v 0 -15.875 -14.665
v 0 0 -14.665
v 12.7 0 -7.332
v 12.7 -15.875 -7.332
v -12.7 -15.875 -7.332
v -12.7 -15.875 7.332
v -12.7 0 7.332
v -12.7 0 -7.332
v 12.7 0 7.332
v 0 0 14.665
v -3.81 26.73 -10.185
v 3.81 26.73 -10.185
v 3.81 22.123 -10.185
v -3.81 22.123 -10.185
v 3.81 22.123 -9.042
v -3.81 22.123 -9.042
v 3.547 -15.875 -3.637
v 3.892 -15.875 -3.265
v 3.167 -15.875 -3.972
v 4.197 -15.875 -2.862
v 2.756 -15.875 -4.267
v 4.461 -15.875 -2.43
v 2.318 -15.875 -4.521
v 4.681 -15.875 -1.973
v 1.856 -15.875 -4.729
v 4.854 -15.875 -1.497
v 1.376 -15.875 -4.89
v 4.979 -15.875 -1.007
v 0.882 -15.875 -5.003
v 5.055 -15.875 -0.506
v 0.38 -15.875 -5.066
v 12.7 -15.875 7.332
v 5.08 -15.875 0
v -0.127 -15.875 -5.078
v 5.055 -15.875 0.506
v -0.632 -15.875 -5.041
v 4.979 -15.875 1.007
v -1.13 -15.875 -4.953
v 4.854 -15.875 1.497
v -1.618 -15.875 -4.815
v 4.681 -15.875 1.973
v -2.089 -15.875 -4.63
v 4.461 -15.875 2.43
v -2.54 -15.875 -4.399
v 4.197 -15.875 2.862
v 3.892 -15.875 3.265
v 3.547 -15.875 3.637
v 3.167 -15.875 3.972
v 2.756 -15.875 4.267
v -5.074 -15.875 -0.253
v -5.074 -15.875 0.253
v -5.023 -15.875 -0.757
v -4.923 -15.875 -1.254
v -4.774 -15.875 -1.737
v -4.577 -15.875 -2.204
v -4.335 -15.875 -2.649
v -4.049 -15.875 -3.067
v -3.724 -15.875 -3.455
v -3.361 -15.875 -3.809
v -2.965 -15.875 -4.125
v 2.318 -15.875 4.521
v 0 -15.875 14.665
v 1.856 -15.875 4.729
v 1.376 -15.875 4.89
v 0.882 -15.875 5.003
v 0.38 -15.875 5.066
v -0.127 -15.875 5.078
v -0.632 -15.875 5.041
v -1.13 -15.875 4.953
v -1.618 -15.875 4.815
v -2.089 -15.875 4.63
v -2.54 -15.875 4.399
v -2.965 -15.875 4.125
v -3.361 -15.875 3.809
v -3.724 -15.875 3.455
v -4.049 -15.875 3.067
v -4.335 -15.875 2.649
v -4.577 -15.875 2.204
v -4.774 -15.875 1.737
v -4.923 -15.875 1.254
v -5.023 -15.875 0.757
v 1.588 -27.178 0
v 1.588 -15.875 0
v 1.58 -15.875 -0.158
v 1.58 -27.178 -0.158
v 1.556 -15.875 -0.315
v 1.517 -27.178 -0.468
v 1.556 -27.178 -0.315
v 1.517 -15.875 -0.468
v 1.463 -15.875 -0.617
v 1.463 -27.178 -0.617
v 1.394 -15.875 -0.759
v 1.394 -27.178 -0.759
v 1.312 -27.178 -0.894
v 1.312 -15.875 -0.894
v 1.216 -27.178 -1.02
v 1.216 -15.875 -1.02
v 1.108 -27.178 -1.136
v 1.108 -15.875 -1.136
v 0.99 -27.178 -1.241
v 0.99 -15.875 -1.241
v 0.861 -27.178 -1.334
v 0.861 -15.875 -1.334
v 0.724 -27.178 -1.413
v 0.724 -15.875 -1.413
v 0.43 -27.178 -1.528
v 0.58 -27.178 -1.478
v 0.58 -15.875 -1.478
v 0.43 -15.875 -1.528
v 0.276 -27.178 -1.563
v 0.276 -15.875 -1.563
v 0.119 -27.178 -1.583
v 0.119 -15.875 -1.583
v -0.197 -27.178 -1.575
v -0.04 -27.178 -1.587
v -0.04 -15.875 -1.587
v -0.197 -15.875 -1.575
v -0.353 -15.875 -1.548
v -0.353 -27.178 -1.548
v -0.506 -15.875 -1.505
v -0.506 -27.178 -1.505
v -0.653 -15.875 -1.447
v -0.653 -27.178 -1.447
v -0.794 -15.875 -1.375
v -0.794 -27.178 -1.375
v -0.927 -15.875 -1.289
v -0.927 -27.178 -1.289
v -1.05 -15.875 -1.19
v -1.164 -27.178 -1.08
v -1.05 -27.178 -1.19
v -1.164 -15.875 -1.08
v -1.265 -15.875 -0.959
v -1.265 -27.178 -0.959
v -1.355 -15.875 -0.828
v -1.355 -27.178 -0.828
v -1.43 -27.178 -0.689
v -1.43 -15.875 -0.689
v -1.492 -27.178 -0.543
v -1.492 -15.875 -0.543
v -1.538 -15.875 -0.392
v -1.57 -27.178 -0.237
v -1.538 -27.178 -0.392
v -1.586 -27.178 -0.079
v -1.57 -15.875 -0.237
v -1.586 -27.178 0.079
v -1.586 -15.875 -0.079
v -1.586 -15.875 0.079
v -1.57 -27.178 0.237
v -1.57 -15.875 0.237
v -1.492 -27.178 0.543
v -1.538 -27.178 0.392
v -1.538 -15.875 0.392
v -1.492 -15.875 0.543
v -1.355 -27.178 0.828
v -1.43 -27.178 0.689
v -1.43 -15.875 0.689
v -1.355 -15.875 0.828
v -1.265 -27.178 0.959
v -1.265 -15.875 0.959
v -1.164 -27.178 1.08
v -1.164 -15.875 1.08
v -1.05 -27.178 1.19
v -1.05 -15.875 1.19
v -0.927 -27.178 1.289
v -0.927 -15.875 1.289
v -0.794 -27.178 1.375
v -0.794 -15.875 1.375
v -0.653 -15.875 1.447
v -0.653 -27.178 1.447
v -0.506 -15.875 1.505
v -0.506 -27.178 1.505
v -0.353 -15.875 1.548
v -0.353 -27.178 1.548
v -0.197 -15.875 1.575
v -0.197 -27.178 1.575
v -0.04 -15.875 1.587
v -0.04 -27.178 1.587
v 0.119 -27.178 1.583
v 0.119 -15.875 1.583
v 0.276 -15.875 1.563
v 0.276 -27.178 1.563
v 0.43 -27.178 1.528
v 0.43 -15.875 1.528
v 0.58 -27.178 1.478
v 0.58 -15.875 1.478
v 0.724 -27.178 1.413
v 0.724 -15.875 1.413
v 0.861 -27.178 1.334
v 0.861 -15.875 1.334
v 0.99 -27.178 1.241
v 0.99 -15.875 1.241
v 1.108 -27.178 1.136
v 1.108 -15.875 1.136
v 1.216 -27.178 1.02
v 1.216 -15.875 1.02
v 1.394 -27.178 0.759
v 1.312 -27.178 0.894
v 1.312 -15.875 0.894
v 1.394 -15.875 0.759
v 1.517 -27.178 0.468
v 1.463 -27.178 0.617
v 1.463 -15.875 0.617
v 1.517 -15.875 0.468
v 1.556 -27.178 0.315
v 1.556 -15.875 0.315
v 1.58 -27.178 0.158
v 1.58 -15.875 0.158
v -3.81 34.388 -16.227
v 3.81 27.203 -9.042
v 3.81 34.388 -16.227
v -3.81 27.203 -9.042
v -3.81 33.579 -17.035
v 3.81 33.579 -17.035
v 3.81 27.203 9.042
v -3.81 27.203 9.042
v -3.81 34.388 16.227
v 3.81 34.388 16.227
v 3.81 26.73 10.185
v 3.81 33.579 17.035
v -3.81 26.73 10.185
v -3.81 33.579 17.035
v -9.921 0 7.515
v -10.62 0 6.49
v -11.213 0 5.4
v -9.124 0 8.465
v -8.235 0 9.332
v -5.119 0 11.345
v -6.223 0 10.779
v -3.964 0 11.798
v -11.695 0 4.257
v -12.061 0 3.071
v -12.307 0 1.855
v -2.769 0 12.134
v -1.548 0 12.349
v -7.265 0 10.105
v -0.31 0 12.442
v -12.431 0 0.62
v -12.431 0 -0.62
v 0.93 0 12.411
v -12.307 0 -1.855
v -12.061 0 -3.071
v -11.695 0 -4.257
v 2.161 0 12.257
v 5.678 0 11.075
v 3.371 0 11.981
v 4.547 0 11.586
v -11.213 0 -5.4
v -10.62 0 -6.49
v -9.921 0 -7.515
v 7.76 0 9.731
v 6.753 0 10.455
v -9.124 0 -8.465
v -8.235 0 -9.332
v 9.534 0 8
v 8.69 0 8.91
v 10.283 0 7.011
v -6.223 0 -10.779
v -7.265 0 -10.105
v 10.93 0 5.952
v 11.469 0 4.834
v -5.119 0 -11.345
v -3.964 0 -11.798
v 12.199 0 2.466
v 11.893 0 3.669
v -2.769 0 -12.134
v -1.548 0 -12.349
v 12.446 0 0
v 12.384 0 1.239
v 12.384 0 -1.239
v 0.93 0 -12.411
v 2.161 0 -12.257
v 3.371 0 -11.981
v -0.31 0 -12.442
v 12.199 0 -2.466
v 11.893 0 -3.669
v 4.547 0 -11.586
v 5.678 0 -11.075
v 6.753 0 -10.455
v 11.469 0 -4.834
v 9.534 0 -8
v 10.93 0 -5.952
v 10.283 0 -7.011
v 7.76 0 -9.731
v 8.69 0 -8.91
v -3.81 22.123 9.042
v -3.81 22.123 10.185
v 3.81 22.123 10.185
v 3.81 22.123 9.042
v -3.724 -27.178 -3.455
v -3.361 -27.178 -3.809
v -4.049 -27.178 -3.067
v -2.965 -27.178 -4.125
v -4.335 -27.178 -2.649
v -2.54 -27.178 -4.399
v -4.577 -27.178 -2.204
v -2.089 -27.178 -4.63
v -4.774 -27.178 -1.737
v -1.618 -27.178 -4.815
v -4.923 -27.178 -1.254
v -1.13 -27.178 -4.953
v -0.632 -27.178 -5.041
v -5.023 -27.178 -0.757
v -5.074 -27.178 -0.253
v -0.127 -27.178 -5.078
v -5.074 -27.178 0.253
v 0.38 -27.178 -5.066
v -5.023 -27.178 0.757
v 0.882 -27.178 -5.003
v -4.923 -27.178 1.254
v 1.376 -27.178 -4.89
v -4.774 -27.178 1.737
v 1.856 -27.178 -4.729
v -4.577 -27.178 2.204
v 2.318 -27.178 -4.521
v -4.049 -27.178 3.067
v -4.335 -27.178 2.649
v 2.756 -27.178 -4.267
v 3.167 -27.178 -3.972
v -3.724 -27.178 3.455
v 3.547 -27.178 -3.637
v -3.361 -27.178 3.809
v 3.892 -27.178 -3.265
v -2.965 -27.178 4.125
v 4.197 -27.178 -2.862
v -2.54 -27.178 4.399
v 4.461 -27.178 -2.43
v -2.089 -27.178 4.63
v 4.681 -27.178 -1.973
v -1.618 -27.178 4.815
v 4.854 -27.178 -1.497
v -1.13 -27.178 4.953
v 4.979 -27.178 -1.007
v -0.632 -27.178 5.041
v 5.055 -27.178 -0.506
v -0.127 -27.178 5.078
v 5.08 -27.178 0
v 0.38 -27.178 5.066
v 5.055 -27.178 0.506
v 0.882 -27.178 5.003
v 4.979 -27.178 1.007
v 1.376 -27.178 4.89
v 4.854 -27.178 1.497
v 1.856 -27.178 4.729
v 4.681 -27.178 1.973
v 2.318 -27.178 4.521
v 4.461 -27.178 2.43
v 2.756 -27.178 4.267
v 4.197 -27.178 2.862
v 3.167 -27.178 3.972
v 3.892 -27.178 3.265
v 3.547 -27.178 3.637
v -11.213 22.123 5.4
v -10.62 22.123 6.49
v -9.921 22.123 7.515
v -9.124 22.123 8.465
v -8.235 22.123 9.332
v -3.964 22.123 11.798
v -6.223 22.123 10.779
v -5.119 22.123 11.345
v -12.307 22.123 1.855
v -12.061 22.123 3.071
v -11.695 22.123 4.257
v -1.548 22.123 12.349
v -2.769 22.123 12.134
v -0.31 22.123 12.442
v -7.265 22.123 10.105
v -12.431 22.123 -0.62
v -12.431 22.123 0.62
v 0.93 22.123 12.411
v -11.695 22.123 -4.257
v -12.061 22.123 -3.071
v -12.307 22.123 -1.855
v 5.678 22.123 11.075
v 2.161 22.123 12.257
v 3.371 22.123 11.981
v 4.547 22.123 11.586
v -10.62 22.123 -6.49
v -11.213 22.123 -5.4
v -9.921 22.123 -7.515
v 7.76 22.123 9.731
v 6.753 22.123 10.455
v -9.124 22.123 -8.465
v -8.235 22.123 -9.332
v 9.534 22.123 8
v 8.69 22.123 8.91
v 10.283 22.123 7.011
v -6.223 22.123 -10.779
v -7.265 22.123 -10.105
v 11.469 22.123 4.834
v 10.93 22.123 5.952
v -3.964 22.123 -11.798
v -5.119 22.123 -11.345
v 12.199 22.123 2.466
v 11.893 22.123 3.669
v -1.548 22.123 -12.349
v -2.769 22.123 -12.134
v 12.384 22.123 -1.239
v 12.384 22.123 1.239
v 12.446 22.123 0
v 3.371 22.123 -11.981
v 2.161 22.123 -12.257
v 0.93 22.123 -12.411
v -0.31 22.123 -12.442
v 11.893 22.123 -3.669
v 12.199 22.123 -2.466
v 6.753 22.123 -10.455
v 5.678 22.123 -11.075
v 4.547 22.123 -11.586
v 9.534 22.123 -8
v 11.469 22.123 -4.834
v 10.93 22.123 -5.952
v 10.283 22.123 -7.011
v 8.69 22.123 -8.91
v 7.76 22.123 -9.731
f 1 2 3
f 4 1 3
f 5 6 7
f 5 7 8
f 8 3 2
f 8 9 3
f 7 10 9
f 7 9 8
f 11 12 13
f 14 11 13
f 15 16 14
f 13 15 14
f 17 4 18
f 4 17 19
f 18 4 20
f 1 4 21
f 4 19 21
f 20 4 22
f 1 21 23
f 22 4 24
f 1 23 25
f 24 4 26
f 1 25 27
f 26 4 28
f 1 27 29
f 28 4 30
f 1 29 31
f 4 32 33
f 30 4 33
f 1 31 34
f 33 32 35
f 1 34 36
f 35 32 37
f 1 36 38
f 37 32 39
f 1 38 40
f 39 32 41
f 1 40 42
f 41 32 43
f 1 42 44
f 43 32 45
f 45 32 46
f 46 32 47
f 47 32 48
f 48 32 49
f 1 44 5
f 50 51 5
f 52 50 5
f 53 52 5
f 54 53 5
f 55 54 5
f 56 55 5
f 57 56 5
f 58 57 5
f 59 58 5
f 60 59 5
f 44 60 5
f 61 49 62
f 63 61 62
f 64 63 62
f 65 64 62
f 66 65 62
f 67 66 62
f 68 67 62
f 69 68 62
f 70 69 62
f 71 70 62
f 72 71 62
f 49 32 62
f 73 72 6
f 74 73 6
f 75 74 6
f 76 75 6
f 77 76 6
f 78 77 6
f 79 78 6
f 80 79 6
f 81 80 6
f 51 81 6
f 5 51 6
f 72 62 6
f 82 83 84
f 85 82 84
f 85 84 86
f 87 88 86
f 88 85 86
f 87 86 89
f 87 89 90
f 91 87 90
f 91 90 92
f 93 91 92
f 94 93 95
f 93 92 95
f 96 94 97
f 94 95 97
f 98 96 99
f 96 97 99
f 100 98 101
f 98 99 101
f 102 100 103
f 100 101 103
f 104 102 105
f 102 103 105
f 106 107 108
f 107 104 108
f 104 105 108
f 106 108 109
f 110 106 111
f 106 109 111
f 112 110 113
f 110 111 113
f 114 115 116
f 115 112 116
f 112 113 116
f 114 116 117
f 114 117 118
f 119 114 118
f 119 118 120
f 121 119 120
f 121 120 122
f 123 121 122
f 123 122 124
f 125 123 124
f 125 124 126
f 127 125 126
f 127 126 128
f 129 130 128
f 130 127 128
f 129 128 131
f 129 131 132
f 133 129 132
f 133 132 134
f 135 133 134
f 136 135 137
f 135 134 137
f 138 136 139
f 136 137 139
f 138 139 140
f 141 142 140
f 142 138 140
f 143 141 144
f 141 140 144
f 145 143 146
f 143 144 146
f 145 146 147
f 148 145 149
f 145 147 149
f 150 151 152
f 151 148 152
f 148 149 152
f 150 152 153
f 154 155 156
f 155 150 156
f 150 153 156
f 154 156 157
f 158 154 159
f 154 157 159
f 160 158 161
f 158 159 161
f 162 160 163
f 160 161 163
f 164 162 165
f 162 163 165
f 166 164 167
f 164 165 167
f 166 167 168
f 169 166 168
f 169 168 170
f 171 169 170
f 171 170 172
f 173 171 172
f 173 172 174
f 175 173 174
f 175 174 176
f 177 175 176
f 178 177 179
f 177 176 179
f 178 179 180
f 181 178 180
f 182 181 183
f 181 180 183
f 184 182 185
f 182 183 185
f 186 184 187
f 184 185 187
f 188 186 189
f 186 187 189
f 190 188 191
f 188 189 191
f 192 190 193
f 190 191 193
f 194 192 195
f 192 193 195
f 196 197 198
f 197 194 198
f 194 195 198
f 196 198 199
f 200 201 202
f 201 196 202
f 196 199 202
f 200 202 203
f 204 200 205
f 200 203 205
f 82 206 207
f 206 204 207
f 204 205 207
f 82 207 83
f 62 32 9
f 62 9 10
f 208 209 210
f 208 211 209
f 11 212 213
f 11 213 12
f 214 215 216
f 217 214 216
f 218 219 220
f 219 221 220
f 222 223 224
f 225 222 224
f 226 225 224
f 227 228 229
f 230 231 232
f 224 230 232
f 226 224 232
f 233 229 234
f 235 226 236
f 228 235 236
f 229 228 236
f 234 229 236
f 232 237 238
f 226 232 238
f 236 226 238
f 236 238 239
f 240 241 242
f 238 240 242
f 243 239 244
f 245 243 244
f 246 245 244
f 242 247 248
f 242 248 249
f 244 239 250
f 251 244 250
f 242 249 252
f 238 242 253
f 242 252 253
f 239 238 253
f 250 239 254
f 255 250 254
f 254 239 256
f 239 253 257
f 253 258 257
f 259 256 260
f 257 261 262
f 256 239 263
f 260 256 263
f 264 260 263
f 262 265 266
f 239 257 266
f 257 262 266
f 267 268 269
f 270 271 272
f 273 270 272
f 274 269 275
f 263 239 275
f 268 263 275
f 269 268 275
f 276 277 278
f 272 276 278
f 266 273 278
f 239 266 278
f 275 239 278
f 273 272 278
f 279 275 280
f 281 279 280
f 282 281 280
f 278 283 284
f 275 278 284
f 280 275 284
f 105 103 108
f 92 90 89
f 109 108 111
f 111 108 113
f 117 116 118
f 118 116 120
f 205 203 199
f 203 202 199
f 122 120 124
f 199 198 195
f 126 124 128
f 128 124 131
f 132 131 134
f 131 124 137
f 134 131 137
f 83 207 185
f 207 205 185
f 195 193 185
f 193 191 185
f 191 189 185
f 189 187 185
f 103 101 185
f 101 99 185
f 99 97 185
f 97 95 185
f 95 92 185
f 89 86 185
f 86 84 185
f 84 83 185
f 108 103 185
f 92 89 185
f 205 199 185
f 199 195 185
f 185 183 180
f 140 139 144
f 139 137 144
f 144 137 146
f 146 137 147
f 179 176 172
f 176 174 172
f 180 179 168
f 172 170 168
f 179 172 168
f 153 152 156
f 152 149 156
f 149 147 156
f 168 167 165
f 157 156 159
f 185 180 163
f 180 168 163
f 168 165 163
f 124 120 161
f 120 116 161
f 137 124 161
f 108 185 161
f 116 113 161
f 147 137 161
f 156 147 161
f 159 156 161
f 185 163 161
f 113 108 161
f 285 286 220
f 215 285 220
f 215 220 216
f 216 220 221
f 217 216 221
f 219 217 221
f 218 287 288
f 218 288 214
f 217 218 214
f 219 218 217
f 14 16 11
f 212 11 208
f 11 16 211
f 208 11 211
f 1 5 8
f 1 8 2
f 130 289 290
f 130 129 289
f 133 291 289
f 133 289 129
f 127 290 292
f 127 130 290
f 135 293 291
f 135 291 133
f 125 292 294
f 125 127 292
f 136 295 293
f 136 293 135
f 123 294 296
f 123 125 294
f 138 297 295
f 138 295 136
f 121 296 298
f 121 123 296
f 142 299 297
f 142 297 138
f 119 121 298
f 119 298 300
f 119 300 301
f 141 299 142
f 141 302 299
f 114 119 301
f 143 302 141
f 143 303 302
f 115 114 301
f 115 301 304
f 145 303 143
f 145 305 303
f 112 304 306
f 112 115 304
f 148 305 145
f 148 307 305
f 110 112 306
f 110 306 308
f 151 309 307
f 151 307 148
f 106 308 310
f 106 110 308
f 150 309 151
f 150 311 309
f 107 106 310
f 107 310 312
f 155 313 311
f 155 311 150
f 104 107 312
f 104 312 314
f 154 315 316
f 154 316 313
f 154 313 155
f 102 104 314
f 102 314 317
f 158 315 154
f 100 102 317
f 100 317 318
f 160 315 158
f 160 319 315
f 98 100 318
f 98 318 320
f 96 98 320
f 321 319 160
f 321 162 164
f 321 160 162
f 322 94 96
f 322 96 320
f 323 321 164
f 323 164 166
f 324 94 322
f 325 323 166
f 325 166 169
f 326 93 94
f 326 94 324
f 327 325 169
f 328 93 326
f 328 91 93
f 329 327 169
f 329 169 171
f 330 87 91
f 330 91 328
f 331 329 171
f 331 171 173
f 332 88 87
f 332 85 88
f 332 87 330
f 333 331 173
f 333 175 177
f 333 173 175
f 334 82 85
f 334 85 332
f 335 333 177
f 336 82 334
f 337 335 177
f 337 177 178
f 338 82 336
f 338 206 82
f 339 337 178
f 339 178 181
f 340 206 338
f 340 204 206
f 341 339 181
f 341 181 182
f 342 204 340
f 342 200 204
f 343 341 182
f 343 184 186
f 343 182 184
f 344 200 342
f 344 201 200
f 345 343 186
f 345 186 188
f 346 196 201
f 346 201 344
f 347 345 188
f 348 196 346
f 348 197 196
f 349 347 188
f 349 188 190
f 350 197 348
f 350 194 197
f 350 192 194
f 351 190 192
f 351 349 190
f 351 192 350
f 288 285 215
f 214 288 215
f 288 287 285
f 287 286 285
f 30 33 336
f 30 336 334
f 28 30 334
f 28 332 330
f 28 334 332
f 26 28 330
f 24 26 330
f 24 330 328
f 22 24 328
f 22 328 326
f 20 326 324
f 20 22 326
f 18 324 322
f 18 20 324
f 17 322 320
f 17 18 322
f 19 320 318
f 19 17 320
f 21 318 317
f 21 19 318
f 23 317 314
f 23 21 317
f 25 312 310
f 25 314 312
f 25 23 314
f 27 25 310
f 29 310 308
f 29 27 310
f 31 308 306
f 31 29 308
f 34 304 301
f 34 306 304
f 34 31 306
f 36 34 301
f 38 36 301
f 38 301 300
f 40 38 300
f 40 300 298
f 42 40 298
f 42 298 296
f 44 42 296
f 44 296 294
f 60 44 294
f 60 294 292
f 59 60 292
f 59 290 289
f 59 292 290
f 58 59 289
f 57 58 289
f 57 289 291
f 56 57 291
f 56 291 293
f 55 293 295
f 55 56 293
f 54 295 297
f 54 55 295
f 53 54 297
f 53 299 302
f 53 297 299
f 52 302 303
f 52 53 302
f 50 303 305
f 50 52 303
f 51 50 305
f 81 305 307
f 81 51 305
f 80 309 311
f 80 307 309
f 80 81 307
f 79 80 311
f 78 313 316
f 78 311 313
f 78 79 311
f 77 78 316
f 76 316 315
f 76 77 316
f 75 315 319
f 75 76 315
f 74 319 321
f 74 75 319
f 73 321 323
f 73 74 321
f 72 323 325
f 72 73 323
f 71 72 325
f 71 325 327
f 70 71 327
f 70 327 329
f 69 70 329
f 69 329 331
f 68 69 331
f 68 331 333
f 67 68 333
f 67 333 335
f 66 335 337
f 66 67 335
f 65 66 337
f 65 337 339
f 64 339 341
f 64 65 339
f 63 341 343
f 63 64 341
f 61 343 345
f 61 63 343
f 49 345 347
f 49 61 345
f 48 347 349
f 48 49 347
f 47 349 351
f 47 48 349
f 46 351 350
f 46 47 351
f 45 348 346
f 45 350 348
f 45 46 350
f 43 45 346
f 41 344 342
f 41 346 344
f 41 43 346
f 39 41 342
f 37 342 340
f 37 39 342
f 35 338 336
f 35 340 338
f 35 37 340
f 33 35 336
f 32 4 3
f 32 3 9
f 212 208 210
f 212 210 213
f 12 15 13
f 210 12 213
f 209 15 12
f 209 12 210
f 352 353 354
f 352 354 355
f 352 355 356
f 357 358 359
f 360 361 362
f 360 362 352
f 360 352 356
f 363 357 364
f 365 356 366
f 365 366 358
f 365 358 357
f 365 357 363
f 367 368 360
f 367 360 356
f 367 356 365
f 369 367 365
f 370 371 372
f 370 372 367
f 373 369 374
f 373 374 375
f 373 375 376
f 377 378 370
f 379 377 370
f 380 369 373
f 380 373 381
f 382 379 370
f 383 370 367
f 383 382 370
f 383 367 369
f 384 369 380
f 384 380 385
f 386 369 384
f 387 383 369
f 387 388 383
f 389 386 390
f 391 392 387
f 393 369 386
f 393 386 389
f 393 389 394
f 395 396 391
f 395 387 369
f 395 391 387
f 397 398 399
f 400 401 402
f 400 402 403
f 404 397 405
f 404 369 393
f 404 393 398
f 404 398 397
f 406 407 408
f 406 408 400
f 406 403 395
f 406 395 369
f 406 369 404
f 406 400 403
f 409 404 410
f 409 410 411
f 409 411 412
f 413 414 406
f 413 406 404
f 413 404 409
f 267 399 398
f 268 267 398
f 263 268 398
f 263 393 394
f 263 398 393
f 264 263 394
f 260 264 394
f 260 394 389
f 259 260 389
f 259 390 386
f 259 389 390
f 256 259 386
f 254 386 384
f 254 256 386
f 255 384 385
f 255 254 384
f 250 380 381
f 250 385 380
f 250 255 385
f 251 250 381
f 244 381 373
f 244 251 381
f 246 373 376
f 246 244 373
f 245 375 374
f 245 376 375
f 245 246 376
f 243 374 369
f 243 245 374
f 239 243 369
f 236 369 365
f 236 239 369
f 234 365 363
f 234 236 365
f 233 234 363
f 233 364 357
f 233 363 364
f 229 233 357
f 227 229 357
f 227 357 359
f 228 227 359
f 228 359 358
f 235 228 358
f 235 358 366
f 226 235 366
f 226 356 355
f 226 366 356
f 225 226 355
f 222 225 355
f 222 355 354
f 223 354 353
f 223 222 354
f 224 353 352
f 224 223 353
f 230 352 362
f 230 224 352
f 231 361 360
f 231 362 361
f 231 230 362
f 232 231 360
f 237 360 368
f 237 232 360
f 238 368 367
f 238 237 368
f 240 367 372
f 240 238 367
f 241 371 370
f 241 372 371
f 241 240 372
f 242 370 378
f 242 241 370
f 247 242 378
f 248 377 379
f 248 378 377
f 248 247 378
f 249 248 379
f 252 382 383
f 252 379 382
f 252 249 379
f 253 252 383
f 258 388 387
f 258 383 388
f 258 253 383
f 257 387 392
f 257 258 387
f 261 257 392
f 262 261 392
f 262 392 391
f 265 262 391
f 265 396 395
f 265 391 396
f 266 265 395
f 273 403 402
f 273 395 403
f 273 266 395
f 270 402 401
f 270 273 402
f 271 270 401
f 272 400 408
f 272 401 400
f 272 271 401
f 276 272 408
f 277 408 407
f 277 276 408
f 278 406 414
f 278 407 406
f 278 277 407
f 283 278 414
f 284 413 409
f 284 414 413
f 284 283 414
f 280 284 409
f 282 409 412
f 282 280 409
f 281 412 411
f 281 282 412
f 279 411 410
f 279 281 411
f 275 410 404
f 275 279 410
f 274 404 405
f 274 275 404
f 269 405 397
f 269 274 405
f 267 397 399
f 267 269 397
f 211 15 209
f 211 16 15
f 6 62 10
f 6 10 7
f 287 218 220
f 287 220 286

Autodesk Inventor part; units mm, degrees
ref_plane "YZ Plane" through (0, 0, 0) normal (1, 0, 0) x (0, 1, 0)
ref_plane "XZ Plane" through (0, 0, 0) normal (0, 1, 0) x (-1, 0, 0)
ref_plane "XY Plane" through (0, 0, 0) normal (0, 0, 1) x (1, 0, 0)
sketch "Sketch1" plane through (0, 0, 0) normal (0, 1, 0) x (-1, 0, 0)
  circle A0 centre (0, 0) radius 12.7 construction
  line L0 (12.7, -7.3323) -> (0, -14.6647)
  line L1 (0, -14.6647) -> (-12.7, -7.3323)
  line L2 (-12.7, -7.3323) -> (-12.7, 7.3323)
  line L3 (-12.7, 7.3323) -> (0, 14.6647)
  line L4 (0, 14.6647) -> (12.7, 7.3323)
  line L5 (12.7, 7.3323) -> (12.7, -7.3323)
  point P0 (12.7, 0)
  dimension "d0" = 25.4
extrude "Extrusion1" add sketch "Sketch1" against normal blind 15.875
sketch "Sketch2" plane through (0, -15.875, 0) normal (0, -1, 0) x (1, 0, 0)
  circle A0 centre (0, 0) radius 1.5875
  circle A1 centre (0, 0) radius 5.08
  dimension "d3" = 3.175
  dimension "d4" = 10.16
extrude "Extrusion2" add sketch "Sketch2" along normal blind 11.303
sketch "Sketch3" plane through (0, 0, 0) normal (0, 1, 0) x (1, 0, 0)
  circle A0 centre (0, 0) radius 12.446
  dimension "d7" = 24.892
extrude "Extrusion3" add sketch "Sketch3" along normal blind 22.1234 separate body
sketch "Sketch4" plane through (0, 0, 0) normal (1, 0, 0) x (0, 1, 0)
  line L0 (22.1234, -12.446) -> (22.1234, 12.446) construction
  circle A0 centre (22.1234, 0) radius 9.0424 construction
  line L1 (22.1234, -9.0424) -> (27.2034, -9.0424)
  line L2 (22.1234, 9.0424) -> (27.2034, 9.0424)
  line L3 (27.2034, 9.0424) -> (34.3876, 16.2266)
  line L4 (27.2034, -9.0424) -> (34.3876, -16.2266)
  line L5 (27.2034, -9.0424) -> (37.3634, -9.0424) construction
  line L6 (33.5794, 17.0348) -> (26.73, 10.1854)
  line L7 (26.73, 10.1854) -> (22.1234, 10.1854)
  line L8 (33.5794, -17.0348) -> (26.73, -10.1854)
  line L9 (26.73, -10.1854) -> (22.1234, -10.1854)
  line L10 (22.1234, 10.1854) -> (22.1234, 9.0424)
  line L11 (22.1234, -9.0424) -> (22.1234, -10.1854)
  line L12 (34.3876, -16.2266) -> (33.5794, -17.0348)
  line L13 (34.3876, 16.2266) -> (33.5794, 17.0348)
  point P0 (0, 0)
  dimension "d10" = 18.0848
  dimension "d11" = 5.08
  dimension "d12" = 5.08
  dimension "d13" = 10.16
  dimension "d14" = 135
  dimension "d15" = 10.16
  dimension "d16" = 45
  dimension "d17" = 1.143
  dimension "d18" = 1.143
extrude "Extrusion4" add sketch "Sketch4" along normal mid plane 7.62 separate body
properties part number "am-2006" material "Brass"
